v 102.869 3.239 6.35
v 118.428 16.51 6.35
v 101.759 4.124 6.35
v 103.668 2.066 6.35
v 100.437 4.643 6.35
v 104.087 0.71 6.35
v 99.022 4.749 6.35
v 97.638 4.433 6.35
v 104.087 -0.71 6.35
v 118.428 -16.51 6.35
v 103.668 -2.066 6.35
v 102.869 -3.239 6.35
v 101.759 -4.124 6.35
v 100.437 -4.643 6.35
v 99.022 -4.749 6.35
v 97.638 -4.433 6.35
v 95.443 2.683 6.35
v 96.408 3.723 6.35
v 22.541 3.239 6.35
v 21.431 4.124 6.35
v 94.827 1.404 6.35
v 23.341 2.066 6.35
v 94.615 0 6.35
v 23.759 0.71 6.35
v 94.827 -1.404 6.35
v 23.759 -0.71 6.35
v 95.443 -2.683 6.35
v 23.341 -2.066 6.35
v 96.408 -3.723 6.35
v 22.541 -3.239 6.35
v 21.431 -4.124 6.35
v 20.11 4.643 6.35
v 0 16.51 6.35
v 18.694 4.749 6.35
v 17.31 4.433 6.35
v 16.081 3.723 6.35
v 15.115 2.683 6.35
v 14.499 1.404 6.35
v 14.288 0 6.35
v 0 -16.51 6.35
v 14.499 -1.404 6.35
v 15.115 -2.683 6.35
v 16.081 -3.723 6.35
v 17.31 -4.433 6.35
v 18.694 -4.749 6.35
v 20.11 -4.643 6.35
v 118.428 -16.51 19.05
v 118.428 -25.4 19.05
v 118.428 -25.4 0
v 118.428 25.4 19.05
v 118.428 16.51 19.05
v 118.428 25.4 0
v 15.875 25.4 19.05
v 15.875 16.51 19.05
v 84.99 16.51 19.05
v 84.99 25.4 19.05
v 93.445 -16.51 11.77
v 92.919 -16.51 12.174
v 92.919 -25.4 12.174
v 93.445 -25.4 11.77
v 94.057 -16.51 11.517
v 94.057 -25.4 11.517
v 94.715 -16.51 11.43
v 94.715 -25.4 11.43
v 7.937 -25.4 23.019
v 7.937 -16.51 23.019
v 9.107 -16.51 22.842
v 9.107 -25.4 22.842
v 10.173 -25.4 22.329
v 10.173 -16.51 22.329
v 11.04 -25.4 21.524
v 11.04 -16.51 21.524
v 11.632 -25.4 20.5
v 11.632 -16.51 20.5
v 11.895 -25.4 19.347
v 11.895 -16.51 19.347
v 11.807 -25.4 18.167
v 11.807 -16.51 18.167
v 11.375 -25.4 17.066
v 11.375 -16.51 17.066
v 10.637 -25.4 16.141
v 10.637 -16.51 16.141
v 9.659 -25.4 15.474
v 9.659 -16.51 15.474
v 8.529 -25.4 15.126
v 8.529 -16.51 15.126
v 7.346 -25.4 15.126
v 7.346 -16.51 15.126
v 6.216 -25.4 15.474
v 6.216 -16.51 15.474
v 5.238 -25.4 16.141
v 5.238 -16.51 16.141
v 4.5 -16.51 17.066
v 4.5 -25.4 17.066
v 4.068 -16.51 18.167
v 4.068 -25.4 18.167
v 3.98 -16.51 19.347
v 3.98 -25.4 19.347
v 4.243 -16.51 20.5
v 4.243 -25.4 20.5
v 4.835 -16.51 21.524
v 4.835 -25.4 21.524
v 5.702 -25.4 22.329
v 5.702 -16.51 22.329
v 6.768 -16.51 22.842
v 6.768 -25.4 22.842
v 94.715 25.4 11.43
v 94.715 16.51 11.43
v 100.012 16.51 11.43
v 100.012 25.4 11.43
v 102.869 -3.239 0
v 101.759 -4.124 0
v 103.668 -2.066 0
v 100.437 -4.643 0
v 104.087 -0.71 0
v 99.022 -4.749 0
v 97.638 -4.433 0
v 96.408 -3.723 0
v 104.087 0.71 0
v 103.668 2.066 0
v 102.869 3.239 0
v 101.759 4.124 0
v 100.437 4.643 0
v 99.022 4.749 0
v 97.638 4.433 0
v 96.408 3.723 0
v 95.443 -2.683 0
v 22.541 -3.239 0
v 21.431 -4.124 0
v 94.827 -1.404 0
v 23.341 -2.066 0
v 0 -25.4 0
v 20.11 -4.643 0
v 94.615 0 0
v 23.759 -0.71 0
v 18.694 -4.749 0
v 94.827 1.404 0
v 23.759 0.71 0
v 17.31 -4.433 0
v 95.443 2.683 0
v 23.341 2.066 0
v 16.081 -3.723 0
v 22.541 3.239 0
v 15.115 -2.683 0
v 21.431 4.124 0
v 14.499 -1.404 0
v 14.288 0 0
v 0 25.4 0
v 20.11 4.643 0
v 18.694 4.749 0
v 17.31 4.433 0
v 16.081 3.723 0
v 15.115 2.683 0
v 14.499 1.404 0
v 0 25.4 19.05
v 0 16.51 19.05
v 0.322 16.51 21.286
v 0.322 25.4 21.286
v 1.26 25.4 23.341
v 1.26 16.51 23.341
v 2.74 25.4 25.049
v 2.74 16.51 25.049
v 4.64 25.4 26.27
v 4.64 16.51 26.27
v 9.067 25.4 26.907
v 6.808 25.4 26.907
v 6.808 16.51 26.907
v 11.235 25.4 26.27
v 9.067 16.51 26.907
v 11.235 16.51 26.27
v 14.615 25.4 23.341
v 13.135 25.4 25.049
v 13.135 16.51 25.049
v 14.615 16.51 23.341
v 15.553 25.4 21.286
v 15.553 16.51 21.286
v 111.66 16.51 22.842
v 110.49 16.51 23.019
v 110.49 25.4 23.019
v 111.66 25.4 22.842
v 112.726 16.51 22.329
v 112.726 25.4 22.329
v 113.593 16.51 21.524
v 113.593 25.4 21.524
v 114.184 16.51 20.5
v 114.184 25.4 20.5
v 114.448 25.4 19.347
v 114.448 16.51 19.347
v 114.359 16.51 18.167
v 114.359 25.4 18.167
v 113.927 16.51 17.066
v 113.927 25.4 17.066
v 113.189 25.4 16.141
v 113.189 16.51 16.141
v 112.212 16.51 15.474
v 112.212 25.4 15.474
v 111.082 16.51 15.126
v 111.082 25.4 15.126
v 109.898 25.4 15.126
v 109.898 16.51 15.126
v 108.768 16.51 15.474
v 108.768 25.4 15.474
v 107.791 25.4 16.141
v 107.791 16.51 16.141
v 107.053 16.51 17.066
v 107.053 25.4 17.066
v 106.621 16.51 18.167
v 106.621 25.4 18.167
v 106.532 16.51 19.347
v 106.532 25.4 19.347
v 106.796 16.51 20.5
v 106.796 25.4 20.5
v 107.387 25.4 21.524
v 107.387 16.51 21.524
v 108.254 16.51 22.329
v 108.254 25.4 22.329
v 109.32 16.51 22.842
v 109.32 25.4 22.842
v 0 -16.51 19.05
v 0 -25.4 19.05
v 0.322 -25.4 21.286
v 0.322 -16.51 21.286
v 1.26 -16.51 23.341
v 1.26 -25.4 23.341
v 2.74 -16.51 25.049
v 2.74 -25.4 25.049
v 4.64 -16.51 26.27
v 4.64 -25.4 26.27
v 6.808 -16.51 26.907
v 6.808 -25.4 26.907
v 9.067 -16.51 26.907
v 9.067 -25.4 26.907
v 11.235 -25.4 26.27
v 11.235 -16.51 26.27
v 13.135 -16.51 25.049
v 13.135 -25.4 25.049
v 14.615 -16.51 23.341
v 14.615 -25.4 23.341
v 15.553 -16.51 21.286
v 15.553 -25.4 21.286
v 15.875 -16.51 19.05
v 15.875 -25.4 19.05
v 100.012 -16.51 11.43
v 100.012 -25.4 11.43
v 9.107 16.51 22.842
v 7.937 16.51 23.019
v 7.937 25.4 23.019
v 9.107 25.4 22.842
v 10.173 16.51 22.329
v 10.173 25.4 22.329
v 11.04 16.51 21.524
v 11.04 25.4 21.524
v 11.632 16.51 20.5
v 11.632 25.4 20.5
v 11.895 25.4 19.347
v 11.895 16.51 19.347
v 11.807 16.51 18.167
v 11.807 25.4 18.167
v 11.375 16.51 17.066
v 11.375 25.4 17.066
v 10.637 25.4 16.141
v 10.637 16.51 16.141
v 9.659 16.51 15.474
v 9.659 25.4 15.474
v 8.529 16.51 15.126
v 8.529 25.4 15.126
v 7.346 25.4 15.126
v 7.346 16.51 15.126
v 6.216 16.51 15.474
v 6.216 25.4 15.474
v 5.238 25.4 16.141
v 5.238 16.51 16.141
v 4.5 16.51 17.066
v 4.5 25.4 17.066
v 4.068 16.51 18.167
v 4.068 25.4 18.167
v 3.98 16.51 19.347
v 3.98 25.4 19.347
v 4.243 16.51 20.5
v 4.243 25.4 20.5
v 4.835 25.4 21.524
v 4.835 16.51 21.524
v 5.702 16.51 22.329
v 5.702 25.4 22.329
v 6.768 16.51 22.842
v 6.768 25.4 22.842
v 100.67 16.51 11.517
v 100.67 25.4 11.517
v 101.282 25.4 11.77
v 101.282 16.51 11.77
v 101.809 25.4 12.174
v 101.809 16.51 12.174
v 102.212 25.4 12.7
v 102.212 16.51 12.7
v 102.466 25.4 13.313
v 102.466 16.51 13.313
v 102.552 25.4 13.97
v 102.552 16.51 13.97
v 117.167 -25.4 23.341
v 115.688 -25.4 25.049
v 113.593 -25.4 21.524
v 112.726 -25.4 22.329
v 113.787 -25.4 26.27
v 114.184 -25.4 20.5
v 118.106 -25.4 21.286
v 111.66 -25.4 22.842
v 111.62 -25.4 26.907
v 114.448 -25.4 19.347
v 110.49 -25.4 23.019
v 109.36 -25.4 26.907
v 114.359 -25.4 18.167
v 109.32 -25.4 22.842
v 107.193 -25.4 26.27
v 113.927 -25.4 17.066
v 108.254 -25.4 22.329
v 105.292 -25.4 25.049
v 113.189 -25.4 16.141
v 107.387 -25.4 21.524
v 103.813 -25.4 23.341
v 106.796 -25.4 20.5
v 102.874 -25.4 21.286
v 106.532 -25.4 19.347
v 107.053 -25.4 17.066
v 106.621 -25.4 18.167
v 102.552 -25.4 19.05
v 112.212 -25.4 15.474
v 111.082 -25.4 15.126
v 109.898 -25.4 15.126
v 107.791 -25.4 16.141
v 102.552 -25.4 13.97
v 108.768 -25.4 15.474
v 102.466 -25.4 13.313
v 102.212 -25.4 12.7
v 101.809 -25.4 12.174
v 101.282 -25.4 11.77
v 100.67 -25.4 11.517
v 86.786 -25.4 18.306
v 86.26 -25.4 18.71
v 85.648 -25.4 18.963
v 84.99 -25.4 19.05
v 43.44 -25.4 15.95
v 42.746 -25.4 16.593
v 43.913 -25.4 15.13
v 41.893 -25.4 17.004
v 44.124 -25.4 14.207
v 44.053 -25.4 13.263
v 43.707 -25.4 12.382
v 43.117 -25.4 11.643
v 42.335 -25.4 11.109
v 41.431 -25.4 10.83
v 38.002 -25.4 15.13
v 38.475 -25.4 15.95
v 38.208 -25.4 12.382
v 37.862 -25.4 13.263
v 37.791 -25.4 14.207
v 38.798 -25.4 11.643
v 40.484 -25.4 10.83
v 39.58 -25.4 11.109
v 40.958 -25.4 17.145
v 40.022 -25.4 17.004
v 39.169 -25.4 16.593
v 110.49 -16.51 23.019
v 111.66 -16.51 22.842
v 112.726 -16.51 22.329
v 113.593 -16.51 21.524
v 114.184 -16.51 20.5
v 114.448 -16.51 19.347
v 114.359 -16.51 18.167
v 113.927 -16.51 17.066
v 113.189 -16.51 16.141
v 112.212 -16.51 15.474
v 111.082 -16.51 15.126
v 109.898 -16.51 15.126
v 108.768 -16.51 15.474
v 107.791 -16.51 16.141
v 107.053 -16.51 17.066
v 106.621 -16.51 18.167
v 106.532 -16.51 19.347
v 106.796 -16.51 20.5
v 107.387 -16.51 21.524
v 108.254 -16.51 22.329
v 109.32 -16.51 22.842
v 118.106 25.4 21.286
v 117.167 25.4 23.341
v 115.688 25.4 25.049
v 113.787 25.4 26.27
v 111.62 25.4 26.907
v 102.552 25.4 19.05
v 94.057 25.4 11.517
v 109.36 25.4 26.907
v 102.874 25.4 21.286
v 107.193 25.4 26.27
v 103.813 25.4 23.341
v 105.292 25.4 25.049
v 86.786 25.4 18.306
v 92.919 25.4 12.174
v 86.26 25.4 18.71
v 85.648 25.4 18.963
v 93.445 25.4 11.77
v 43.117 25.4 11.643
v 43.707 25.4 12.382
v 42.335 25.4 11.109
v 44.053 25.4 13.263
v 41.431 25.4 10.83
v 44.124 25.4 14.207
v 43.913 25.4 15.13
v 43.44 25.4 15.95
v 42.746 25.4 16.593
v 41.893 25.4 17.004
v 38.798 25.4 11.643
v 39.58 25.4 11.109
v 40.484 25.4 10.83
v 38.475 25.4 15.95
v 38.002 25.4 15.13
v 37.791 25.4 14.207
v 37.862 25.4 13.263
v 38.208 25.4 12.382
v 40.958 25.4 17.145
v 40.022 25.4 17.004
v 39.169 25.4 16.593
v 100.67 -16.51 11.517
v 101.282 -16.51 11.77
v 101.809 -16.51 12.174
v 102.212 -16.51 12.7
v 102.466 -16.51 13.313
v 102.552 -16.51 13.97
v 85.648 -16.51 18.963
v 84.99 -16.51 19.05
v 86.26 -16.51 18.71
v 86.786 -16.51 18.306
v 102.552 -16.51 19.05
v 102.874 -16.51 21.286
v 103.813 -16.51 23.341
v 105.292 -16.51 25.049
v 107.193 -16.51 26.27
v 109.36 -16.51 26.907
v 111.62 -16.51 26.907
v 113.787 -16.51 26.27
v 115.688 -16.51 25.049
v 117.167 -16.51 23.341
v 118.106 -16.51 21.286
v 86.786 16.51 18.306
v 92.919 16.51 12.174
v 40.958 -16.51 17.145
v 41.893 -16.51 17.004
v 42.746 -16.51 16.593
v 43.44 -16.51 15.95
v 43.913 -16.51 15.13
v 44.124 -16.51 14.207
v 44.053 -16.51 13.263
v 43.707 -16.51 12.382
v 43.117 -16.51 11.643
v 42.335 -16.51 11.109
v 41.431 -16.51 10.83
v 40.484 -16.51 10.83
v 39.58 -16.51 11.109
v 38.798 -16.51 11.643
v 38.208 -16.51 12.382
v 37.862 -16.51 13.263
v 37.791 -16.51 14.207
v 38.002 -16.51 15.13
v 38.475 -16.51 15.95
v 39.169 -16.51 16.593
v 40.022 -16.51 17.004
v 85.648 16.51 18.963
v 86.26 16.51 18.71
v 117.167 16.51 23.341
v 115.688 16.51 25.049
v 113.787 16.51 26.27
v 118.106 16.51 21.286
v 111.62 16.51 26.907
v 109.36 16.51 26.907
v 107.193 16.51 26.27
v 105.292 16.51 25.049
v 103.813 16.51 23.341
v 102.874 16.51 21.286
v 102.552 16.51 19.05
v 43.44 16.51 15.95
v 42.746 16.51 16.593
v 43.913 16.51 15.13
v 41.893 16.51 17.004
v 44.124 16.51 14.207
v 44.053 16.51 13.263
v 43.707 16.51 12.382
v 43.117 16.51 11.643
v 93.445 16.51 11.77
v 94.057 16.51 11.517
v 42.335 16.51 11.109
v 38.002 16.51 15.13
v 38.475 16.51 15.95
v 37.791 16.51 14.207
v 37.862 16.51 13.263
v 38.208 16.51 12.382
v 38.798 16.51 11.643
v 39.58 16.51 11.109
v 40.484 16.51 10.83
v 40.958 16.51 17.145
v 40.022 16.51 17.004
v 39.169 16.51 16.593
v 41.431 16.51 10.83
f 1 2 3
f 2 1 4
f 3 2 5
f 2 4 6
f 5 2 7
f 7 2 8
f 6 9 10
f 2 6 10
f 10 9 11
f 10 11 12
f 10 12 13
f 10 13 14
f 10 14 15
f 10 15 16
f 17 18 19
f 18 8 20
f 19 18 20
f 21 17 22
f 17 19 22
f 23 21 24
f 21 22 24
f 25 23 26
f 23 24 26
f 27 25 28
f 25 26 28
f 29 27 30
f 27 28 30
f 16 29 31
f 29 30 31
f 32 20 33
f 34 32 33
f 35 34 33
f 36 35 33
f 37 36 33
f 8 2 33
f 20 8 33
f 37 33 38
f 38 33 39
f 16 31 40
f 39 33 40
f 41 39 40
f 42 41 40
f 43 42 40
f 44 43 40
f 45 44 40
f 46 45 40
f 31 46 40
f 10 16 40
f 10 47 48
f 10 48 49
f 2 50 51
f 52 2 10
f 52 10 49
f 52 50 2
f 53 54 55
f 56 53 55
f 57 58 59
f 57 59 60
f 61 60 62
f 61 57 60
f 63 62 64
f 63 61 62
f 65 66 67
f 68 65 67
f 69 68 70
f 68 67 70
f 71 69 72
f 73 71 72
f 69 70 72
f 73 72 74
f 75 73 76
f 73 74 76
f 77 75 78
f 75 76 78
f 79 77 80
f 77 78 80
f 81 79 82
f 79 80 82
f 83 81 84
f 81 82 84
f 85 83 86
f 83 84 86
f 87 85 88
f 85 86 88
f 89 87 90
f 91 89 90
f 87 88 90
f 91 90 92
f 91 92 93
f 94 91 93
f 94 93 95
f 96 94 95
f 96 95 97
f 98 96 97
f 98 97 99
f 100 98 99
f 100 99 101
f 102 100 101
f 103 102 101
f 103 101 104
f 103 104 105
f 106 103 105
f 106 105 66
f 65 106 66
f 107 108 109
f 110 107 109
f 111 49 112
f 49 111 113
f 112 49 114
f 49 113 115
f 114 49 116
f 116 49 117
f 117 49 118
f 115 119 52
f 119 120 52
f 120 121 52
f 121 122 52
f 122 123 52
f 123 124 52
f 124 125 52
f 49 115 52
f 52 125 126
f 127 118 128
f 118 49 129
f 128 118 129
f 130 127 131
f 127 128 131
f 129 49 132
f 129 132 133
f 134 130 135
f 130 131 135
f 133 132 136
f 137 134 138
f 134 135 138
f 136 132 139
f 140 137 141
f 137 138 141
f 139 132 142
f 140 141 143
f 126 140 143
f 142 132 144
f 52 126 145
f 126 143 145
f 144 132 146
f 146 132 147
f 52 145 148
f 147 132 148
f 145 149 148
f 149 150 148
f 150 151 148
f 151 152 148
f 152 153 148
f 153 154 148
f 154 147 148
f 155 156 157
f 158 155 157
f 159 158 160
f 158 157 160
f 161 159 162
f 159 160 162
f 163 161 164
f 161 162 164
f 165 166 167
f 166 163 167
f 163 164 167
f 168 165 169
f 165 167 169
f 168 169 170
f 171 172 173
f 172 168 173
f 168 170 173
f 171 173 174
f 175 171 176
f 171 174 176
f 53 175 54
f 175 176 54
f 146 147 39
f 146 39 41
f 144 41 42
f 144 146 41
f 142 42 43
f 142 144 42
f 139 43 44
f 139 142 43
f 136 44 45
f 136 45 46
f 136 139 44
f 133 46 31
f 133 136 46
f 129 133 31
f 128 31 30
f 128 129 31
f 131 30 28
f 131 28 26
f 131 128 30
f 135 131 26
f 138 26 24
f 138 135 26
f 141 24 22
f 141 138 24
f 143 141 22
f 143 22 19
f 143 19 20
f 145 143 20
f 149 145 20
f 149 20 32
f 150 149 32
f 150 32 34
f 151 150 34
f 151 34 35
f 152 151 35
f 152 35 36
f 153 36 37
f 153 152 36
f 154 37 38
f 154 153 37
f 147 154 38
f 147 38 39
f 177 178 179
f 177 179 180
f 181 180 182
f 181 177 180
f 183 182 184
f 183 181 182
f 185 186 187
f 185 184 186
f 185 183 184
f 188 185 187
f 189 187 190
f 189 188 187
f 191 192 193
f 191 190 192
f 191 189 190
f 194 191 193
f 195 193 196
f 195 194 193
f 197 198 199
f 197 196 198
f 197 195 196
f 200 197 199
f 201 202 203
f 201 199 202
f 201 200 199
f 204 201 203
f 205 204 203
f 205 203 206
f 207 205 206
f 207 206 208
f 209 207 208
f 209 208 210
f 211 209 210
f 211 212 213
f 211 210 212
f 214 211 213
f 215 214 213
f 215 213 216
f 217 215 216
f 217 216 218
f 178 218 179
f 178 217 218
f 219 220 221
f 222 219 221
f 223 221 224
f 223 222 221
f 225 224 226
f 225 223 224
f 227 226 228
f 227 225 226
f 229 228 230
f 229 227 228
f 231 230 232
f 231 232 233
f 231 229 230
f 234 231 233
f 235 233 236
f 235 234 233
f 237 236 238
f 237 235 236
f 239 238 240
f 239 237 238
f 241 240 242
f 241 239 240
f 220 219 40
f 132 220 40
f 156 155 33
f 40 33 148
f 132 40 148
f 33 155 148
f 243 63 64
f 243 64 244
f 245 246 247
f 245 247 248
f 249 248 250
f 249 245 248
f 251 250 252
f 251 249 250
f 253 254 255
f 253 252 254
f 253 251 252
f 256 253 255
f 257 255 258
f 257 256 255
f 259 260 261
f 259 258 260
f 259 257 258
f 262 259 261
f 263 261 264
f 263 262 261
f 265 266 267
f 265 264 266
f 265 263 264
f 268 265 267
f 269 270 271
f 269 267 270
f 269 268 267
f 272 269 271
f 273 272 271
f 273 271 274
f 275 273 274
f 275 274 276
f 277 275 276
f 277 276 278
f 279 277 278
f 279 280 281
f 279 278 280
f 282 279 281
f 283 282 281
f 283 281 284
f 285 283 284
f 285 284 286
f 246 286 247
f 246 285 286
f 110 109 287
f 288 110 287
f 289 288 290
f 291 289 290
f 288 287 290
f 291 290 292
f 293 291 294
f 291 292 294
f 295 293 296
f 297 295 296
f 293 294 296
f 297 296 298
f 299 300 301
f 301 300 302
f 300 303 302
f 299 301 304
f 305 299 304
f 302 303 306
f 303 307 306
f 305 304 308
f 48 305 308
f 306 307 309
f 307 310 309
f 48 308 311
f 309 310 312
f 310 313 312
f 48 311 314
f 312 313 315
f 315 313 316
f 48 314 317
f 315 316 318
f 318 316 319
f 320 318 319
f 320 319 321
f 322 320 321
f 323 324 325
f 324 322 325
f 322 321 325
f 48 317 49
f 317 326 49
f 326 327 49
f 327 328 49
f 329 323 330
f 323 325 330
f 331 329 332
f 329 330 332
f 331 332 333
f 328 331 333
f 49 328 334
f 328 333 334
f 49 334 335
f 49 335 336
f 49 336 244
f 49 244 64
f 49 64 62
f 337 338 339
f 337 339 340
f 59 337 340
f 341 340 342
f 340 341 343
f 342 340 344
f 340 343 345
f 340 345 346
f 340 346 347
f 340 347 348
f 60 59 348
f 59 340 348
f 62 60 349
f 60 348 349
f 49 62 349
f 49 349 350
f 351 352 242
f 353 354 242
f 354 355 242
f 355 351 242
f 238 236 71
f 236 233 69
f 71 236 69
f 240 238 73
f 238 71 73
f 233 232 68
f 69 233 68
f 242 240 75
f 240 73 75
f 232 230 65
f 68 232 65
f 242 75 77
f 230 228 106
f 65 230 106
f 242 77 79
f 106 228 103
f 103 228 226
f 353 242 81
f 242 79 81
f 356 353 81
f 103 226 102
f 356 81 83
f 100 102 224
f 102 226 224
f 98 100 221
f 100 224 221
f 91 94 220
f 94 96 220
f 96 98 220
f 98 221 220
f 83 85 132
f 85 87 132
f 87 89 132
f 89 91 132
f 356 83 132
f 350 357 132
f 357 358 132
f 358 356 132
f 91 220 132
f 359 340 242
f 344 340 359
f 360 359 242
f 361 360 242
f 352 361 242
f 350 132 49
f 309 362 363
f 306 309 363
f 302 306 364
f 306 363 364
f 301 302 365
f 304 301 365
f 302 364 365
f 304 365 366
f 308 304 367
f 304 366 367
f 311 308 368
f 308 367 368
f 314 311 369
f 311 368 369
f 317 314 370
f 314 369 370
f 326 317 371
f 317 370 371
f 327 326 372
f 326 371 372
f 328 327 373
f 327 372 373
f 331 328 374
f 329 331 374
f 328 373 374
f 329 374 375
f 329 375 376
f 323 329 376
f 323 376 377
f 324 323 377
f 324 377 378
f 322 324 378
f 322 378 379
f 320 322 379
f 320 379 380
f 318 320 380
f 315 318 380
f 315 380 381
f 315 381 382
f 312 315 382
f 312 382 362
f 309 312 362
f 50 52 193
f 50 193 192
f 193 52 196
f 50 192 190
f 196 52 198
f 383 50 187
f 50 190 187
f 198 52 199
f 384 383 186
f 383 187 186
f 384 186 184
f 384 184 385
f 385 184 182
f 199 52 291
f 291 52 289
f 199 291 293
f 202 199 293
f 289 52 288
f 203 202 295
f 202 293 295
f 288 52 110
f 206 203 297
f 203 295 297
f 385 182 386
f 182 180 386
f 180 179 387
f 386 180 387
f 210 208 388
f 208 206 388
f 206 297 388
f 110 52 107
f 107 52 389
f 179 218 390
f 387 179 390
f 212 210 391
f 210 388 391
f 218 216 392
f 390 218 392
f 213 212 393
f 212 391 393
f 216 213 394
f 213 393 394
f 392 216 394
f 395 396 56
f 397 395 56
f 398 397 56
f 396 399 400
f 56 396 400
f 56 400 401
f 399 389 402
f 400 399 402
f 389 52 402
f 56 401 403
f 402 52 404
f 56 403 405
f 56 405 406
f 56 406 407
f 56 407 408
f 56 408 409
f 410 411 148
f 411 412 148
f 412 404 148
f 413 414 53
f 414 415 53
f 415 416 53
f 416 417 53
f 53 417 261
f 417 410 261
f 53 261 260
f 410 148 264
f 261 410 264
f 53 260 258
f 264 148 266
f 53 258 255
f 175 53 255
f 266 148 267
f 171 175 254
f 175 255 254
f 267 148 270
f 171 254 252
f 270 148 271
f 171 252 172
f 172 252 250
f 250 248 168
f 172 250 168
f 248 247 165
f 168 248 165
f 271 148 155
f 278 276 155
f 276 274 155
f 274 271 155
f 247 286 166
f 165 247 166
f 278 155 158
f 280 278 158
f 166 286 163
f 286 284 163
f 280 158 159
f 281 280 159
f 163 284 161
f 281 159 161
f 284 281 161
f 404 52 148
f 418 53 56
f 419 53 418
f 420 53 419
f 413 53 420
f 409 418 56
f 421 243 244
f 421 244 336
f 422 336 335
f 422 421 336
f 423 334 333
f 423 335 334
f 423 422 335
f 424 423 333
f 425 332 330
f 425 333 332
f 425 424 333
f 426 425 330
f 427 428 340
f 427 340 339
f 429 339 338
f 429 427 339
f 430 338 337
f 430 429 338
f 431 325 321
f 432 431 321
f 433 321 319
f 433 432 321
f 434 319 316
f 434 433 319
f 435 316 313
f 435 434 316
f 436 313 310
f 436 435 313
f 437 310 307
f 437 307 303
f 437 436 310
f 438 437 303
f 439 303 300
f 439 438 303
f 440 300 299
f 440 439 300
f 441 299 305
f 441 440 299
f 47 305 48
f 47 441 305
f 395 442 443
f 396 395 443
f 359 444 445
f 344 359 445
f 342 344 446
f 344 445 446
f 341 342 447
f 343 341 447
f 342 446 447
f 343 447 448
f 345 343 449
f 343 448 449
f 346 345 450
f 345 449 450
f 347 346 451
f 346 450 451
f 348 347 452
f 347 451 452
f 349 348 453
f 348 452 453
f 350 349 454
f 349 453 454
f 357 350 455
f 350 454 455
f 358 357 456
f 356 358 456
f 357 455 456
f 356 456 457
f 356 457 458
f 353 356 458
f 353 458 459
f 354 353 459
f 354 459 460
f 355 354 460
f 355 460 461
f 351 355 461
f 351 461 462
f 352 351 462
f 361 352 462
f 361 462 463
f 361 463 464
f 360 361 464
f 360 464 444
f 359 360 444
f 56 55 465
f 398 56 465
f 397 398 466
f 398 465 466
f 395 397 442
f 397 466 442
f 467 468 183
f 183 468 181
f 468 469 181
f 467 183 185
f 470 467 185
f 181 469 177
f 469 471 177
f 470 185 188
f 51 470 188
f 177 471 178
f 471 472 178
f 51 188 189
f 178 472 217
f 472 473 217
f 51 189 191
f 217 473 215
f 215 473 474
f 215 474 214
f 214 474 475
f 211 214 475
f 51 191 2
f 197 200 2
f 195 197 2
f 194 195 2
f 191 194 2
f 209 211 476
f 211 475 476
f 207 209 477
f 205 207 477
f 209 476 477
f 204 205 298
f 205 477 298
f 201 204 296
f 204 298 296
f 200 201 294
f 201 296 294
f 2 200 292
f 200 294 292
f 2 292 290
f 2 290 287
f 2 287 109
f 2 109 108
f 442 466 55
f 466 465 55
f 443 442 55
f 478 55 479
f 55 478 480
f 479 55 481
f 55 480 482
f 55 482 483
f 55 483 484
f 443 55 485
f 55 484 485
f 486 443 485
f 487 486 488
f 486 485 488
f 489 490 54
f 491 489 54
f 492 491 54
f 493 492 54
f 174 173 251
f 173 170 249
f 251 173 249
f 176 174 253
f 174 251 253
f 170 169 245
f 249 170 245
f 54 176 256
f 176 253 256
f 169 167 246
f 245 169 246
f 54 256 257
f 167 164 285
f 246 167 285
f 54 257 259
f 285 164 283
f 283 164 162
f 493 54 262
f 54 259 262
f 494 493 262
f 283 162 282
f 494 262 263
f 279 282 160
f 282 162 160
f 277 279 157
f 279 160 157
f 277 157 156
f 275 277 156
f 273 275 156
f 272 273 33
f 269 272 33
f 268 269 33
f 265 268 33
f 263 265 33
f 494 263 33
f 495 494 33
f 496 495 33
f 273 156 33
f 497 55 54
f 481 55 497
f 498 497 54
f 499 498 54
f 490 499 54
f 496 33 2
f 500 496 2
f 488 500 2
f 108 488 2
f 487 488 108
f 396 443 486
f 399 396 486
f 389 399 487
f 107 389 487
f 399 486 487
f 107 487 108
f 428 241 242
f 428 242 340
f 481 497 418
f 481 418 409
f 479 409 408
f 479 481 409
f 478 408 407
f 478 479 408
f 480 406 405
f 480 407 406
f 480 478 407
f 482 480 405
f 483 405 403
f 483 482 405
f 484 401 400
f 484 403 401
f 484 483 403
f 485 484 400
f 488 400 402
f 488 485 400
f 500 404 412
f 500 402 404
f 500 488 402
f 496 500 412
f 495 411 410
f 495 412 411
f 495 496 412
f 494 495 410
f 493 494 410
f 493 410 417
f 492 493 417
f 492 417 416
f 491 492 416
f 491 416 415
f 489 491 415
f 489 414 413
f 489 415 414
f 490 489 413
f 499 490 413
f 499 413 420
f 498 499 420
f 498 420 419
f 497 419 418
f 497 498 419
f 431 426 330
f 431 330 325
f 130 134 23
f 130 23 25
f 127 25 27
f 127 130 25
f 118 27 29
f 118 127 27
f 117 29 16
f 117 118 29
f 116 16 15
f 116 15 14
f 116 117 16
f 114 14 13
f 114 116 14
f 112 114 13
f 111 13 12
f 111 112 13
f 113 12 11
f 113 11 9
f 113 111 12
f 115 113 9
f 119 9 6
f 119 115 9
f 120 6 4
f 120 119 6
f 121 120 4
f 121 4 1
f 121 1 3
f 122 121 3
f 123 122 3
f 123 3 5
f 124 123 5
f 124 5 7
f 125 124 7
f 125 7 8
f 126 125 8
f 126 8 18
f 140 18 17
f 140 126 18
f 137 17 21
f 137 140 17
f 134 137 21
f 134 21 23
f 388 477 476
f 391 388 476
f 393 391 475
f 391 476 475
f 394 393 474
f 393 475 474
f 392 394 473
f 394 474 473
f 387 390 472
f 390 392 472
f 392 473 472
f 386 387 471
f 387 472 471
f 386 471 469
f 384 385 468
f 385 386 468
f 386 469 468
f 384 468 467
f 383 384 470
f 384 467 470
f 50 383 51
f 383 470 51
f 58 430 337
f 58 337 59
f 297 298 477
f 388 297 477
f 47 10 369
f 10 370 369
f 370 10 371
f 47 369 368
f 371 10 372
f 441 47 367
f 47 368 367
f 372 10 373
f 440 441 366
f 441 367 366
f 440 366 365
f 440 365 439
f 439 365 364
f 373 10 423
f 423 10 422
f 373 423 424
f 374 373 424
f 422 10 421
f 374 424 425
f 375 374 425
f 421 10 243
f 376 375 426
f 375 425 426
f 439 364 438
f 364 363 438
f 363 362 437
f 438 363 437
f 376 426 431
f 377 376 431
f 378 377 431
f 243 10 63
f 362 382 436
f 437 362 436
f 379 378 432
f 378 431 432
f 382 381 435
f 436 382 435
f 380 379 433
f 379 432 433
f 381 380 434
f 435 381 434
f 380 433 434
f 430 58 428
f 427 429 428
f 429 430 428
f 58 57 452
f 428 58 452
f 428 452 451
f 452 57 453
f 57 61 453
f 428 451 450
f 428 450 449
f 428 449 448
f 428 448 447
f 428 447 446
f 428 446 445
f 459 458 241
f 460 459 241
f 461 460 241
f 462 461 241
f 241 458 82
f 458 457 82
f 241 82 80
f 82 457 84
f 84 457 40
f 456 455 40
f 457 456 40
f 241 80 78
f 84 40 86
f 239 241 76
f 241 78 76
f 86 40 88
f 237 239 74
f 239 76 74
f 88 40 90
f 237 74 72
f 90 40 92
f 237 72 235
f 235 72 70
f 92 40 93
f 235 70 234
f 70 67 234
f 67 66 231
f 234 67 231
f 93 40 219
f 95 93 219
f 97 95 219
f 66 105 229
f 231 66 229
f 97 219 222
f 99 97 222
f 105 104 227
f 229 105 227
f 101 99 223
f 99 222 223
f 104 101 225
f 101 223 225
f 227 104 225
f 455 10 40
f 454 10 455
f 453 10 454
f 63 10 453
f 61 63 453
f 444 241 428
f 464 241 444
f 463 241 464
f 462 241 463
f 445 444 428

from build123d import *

# Parameters (mm, degrees)
BOSS_EXTRUDE1_DEPTH            = 118.4275
CUT_EXTRUDE1_REACH             = 138.757
SKETCH3_R                      = 3.96875
SKETCH3_R_2                    = 3.175
CUT_EXTRUDE1_DIRECTION_2_REACH = 138.757
SKETCH4_R                      = 4.7625
CUT_EXTRUDE2_DEPTH             = 6.35


with BuildPart() as part:
    # Sketch2 → Boss-Extrude1 (new body)
    with BuildSketch(Plane(origin=(0, 0, 0), x_dir=(0, 0, -1), z_dir=(1, 0, 0))):
        Polygon((0, -25.4), (0, 25.4), (-63.5, 25.4), (-63.5, 16.51), (-6.35, 16.51), (-6.35, -16.51), (-63.5, -16.51), (-63.5, -25.4), align=None)
    extrude(amount=BOSS_EXTRUDE1_DEPTH)

    # Cut-Extrude1: up to this face of the body (flat: up to its plane)
    cut_extrude1_end = Plane(part.part.faces().sort_by_distance((59.21375, -25.4, 31.75))[0])
    # Sketch3 → Cut-Extrude1 (cut, up to the picked face)
    with BuildSketch(Plane(origin=(0, 0, 0), x_dir=(1, 0, 0), z_dir=(0, 1, 0)), mode=Mode.PRIVATE) as cut_extrude1_sk1:
        with Locations(Location((7.9375, -19.05, 0), (0, 0, 270))):
            Circle(SKETCH3_R)
    cut_extrude1_tool1 = split(extrude(cut_extrude1_sk1.sketch, amount=-CUT_EXTRUDE1_REACH, mode=Mode.PRIVATE), bisect_by=cut_extrude1_end, keep=Keep.BOTH, mode=Mode.PRIVATE)
    # Sketch3 → Cut-Extrude1 (cut, up to the picked face)
    with BuildSketch(Plane(origin=(0, 0, 0), x_dir=(1, 0, 0), z_dir=(0, 1, 0)), mode=Mode.PRIVATE) as cut_extrude1_sk2:
        with Locations(Location((110.49, -19.05, 0), (0, 0, 270))):
            Circle(SKETCH3_R)
    cut_extrude1_tool2 = split(extrude(cut_extrude1_sk2.sketch, amount=-CUT_EXTRUDE1_REACH, mode=Mode.PRIVATE), bisect_by=cut_extrude1_end, keep=Keep.BOTH, mode=Mode.PRIVATE)
    # Sketch3 → Cut-Extrude1 (cut, up to the picked face)
    with BuildSketch(Plane(origin=(0, 0, 0), x_dir=(1, 0, 0), z_dir=(0, 1, 0)), mode=Mode.PRIVATE) as cut_extrude1_sk3:
        with Locations(Location((40.9575, -13.97, 0), (0, 0, 270))):
            Circle(SKETCH3_R_2)
    cut_extrude1_tool3 = split(extrude(cut_extrude1_sk3.sketch, amount=-CUT_EXTRUDE1_REACH, mode=Mode.PRIVATE), bisect_by=cut_extrude1_end, keep=Keep.BOTH, mode=Mode.PRIVATE)
    # Sketch3 → Cut-Extrude1 (cut, up to the picked face)
    with BuildSketch(Plane(origin=(0, 0, 0), x_dir=(1, 0, 0), z_dir=(0, 1, 0)), mode=Mode.PRIVATE) as cut_extrude1_sk4:
        with BuildLine():
            Line((0, -63.5), (0, -19.05))
            ThreePointArc((0, -19.05), (7.9375, -26.9875), (15.875, -19.05))
            Line((15.875, -19.05), (84.990397552, -19.05))
            ThreePointArc((84.990397552, -19.05), (85.96241347, -18.856654013), (86.786448776, -18.306051224))
            Line((86.786448776, -18.306051224), (92.918551224, -12.173948776))
            ThreePointArc((92.918551224, -12.173948776), (93.74258653, -11.623345987), (94.714602448, -11.43))
            Line((94.714602448, -11.43), (100.0125, -11.43))
            ThreePointArc((100.0125, -11.43), (101.808551224, -12.173948776), (102.5525, -13.97))
            Line((102.5525, -13.97), (102.5525, -19.05))
            ThreePointArc((102.5525, -19.05), (110.49, -26.9875), (118.4275, -19.05))
            Line((118.4275, -19.05), (118.4275, -63.5))
            Line((118.4275, -63.5), (0, -63.5))
        make_face()
    cut_extrude1_tool4 = split(extrude(cut_extrude1_sk4.sketch, amount=-CUT_EXTRUDE1_REACH, mode=Mode.PRIVATE), bisect_by=cut_extrude1_end, keep=Keep.BOTH, mode=Mode.PRIVATE)
    add(cut_extrude1_tool1.solids().sort_by(Axis((7.9375, 0, 19.05), (0, -1, 0)))[0], mode=Mode.SUBTRACT)
    add(cut_extrude1_tool2.solids().sort_by(Axis((110.49, 0, 19.05), (0, -1, 0)))[0], mode=Mode.SUBTRACT)
    add(cut_extrude1_tool3.solids().sort_by(Axis((40.9575, 0, 13.97), (0, -1, 0)))[0], mode=Mode.SUBTRACT)
    add(cut_extrude1_tool4.solids().sort_by(Axis((59.891999, 0, 41.525151), (0, -1, 0)))[0], mode=Mode.SUBTRACT)

    # Cut-Extrude1 direction 2: up to this face of the body (flat: up to its plane)
    cut_extrude1_direction_2_end = Plane(part.part.faces().sort_by_distance((59.21375, 25.4, 31.75))[0])
    # Sketch3 → Cut-Extrude1 direction 2 (cut, up to the picked face)
    with BuildSketch(Plane(origin=(0, 0, 0), x_dir=(1, 0, 0), z_dir=(0, 1, 0)), mode=Mode.PRIVATE) as cut_extrude1_direction_2_sk1:
        with Locations(Location((7.9375, -19.05, 0), (0, 0, 270))):
            Circle(SKETCH3_R)
    cut_extrude1_direction_2_tool1 = split(extrude(cut_extrude1_direction_2_sk1.sketch, amount=CUT_EXTRUDE1_DIRECTION_2_REACH, mode=Mode.PRIVATE), bisect_by=cut_extrude1_direction_2_end, keep=Keep.BOTH, mode=Mode.PRIVATE)
    # Sketch3 → Cut-Extrude1 direction 2 (cut, up to the picked face)
    with BuildSketch(Plane(origin=(0, 0, 0), x_dir=(1, 0, 0), z_dir=(0, 1, 0)), mode=Mode.PRIVATE) as cut_extrude1_direction_2_sk2:
        with Locations(Location((110.49, -19.05, 0), (0, 0, 270))):
            Circle(SKETCH3_R)
    cut_extrude1_direction_2_tool2 = split(extrude(cut_extrude1_direction_2_sk2.sketch, amount=CUT_EXTRUDE1_DIRECTION_2_REACH, mode=Mode.PRIVATE), bisect_by=cut_extrude1_direction_2_end, keep=Keep.BOTH, mode=Mode.PRIVATE)
    # Sketch3 → Cut-Extrude1 direction 2 (cut, up to the picked face)
    with BuildSketch(Plane(origin=(0, 0, 0), x_dir=(1, 0, 0), z_dir=(0, 1, 0)), mode=Mode.PRIVATE) as cut_extrude1_direction_2_sk3:
        with Locations(Location((40.9575, -13.97, 0), (0, 0, 270))):
            Circle(SKETCH3_R_2)
    cut_extrude1_direction_2_tool3 = split(extrude(cut_extrude1_direction_2_sk3.sketch, amount=CUT_EXTRUDE1_DIRECTION_2_REACH, mode=Mode.PRIVATE), bisect_by=cut_extrude1_direction_2_end, keep=Keep.BOTH, mode=Mode.PRIVATE)
    # Sketch3 → Cut-Extrude1 direction 2 (cut, up to the picked face)
    with BuildSketch(Plane(origin=(0, 0, 0), x_dir=(1, 0, 0), z_dir=(0, 1, 0)), mode=Mode.PRIVATE) as cut_extrude1_direction_2_sk4:
        with BuildLine():
            Line((0, -63.5), (0, -19.05))
            ThreePointArc((0, -19.05), (7.9375, -26.9875), (15.875, -19.05))
            Line((15.875, -19.05), (84.990397552, -19.05))
            ThreePointArc((84.990397552, -19.05), (85.96241347, -18.856654013), (86.786448776, -18.306051224))
            Line((86.786448776, -18.306051224), (92.918551224, -12.173948776))
            ThreePointArc((92.918551224, -12.173948776), (93.74258653, -11.623345987), (94.714602448, -11.43))
            Line((94.714602448, -11.43), (100.0125, -11.43))
            ThreePointArc((100.0125, -11.43), (101.808551224, -12.173948776), (102.5525, -13.97))
            Line((102.5525, -13.97), (102.5525, -19.05))
            ThreePointArc((102.5525, -19.05), (110.49, -26.9875), (118.4275, -19.05))
            Line((118.4275, -19.05), (118.4275, -63.5))
            Line((118.4275, -63.5), (0, -63.5))
        make_face()
    cut_extrude1_direction_2_tool4 = split(extrude(cut_extrude1_direction_2_sk4.sketch, amount=CUT_EXTRUDE1_DIRECTION_2_REACH, mode=Mode.PRIVATE), bisect_by=cut_extrude1_direction_2_end, keep=Keep.BOTH, mode=Mode.PRIVATE)
    add(cut_extrude1_direction_2_tool1.solids().sort_by(Axis((7.9375, 0, 19.05), (0, 1, 0)))[0], mode=Mode.SUBTRACT)
    add(cut_extrude1_direction_2_tool2.solids().sort_by(Axis((110.49, 0, 19.05), (0, 1, 0)))[0], mode=Mode.SUBTRACT)
    add(cut_extrude1_direction_2_tool3.solids().sort_by(Axis((40.9575, 0, 13.97), (0, 1, 0)))[0], mode=Mode.SUBTRACT)
    add(cut_extrude1_direction_2_tool4.solids().sort_by(Axis((59.891999, 0, 41.525151), (0, 1, 0)))[0], mode=Mode.SUBTRACT)

    # Sketch4 → Cut-Extrude2 (cut)
    with BuildSketch(Plane.XY):
        with Locations(Location((19.05, 0, 0), (0, 0, 180))):
            Circle(SKETCH4_R)
        with Locations(Location((99.3775, 0, 0), (0, 0, 180))):
            Circle(SKETCH4_R)
    extrude(amount=CUT_EXTRUDE2_DEPTH, mode=Mode.SUBTRACT)


solid = part.part
